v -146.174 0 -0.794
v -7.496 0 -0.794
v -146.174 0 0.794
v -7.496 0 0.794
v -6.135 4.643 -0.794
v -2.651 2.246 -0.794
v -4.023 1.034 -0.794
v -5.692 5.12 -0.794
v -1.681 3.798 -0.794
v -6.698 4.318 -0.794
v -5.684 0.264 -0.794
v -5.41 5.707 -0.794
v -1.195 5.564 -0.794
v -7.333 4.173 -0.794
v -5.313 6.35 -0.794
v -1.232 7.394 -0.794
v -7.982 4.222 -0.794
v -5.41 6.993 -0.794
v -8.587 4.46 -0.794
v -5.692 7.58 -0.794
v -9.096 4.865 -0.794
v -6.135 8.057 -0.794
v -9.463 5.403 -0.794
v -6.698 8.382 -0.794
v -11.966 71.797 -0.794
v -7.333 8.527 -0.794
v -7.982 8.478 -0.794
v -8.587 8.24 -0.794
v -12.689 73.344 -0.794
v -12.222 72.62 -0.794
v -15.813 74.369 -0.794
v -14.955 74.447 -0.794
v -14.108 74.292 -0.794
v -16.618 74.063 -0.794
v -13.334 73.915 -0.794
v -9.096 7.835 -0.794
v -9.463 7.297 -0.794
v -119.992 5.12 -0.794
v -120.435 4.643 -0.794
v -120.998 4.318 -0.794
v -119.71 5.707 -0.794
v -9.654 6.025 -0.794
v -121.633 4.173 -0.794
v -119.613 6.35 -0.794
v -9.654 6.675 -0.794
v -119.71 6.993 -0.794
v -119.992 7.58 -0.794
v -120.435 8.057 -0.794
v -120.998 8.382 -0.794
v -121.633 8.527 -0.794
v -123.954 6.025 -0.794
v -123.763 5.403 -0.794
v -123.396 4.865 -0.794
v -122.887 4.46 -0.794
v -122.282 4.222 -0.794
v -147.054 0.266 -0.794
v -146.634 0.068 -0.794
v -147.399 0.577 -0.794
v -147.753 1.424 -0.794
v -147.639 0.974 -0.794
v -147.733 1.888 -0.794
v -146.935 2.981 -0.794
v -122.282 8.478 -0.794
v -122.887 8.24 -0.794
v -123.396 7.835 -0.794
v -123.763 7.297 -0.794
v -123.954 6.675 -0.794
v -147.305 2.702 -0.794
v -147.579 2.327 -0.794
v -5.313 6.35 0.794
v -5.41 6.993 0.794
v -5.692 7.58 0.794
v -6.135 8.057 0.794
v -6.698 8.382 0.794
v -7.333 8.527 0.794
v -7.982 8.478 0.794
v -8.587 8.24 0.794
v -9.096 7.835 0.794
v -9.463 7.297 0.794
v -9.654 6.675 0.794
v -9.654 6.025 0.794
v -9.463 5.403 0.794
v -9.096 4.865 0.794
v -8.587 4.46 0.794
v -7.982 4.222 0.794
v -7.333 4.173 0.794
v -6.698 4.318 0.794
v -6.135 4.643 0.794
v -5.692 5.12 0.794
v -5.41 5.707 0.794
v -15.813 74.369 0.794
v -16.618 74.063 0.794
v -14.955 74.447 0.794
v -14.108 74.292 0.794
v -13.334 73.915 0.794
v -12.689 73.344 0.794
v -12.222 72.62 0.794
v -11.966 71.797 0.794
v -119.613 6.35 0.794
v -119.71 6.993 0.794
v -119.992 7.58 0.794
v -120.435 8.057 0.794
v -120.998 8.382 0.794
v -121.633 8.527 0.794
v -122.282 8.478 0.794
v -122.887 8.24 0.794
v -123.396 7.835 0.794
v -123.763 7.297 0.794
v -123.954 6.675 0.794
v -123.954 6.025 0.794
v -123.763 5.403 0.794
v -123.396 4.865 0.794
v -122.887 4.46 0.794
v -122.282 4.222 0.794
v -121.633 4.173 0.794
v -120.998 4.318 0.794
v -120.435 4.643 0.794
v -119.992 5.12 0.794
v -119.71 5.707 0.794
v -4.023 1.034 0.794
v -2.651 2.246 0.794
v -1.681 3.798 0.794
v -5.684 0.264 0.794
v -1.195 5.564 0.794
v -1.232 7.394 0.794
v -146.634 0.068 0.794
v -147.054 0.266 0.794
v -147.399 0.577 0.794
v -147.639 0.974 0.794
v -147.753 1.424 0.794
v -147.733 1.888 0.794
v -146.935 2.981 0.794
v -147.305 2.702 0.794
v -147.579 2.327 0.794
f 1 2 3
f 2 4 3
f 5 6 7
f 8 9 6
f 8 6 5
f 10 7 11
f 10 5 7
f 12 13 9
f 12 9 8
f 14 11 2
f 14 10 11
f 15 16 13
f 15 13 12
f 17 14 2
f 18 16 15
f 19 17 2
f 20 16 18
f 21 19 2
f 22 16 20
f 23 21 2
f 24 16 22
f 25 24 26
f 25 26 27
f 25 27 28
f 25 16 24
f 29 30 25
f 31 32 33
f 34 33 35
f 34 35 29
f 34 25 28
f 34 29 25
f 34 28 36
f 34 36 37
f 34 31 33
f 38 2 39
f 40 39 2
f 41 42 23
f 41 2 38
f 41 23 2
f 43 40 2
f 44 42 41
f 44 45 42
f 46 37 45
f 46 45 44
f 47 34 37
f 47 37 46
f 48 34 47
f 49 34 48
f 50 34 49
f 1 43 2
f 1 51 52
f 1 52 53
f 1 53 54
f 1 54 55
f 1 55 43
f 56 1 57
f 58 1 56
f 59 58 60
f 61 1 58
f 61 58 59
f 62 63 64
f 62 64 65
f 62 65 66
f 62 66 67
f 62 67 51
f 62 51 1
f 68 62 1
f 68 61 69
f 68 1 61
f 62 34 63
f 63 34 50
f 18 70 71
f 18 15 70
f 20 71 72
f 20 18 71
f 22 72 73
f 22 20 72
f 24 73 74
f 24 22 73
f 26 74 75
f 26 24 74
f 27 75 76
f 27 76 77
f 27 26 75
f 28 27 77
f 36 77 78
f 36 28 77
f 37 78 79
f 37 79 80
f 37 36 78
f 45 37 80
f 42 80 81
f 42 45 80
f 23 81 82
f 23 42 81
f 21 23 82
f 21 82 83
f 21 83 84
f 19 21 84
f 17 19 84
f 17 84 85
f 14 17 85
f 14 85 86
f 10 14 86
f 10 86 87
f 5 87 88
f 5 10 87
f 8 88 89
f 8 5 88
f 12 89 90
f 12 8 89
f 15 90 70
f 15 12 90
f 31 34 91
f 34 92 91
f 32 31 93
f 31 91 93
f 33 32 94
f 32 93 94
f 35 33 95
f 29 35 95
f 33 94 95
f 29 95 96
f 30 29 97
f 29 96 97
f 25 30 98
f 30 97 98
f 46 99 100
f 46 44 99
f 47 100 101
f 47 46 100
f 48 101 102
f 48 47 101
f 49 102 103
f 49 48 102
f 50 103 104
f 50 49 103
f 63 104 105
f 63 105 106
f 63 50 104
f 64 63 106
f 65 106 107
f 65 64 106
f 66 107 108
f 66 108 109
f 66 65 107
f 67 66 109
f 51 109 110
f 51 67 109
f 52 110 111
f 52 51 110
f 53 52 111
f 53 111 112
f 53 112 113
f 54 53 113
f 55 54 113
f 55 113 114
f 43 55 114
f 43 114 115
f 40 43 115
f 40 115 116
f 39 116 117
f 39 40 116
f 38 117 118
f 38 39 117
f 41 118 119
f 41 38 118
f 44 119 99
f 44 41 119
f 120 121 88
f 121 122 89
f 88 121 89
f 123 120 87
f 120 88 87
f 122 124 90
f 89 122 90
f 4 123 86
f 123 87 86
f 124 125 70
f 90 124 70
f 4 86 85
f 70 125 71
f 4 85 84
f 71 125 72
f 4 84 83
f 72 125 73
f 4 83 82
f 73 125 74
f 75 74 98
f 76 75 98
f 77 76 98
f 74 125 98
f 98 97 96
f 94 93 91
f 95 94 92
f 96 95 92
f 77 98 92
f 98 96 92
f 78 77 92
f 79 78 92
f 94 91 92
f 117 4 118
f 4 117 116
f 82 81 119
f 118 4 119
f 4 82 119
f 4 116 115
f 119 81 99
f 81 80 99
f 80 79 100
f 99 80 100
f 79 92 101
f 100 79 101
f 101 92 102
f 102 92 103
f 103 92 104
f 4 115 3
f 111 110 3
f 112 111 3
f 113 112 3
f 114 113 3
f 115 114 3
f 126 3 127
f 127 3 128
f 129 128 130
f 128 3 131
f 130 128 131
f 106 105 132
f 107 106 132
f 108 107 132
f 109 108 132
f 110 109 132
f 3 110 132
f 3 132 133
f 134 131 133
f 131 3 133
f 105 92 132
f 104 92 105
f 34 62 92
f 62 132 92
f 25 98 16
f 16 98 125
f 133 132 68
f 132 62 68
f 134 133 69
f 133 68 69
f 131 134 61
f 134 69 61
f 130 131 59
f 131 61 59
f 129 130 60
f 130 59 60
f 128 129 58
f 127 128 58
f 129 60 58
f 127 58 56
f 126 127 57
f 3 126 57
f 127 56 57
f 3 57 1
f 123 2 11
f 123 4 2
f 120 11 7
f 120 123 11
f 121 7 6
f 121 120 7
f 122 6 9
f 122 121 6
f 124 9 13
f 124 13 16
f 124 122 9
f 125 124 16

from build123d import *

# Parameters (mm, degrees)
SKETCH1_R           = 2.1828125
BOSS_EXTRUDE1_DEPTH = 0.79375
FILLET1_R           = 6.35
FILLET2_R           = 3.175
FILLET3_R           = 1.5875


with BuildPart() as part:
    # Sketch1 → Boss-Extrude1 (new body, symmetric)
    with BuildSketch(Plane.XY):
        Polygon((0, 0), (-152.4, 0), (-12.7, 76.2), align=None)
        with Locations((-7.495923678, 6.35)):
            Circle(SKETCH1_R, mode=Mode.SUBTRACT)
        with Locations((-121.795923678, 6.35)):
            Circle(SKETCH1_R, mode=Mode.SUBTRACT)
    extrude(amount=BOSS_EXTRUDE1_DEPTH, both=True)

    # Fillet1
    fillet1_edges = [part.edges().sort_by_distance(p)[0] for p in [
        (0, 0, 0),
    ]]
    fillet(fillet1_edges, radius=FILLET1_R)

    # Fillet2
    fillet2_edges = [part.edges().sort_by_distance(p)[0] for p in [
        (-12.7, 76.2, 0),
    ]]
    fillet(fillet2_edges, radius=FILLET2_R)

    # Fillet3
    fillet3_edges = [part.edges().sort_by_distance(p)[0] for p in [
        (-152.4, 0, 0),
    ]]
    fillet(fillet3_edges, radius=FILLET3_R)


solid = part.part
